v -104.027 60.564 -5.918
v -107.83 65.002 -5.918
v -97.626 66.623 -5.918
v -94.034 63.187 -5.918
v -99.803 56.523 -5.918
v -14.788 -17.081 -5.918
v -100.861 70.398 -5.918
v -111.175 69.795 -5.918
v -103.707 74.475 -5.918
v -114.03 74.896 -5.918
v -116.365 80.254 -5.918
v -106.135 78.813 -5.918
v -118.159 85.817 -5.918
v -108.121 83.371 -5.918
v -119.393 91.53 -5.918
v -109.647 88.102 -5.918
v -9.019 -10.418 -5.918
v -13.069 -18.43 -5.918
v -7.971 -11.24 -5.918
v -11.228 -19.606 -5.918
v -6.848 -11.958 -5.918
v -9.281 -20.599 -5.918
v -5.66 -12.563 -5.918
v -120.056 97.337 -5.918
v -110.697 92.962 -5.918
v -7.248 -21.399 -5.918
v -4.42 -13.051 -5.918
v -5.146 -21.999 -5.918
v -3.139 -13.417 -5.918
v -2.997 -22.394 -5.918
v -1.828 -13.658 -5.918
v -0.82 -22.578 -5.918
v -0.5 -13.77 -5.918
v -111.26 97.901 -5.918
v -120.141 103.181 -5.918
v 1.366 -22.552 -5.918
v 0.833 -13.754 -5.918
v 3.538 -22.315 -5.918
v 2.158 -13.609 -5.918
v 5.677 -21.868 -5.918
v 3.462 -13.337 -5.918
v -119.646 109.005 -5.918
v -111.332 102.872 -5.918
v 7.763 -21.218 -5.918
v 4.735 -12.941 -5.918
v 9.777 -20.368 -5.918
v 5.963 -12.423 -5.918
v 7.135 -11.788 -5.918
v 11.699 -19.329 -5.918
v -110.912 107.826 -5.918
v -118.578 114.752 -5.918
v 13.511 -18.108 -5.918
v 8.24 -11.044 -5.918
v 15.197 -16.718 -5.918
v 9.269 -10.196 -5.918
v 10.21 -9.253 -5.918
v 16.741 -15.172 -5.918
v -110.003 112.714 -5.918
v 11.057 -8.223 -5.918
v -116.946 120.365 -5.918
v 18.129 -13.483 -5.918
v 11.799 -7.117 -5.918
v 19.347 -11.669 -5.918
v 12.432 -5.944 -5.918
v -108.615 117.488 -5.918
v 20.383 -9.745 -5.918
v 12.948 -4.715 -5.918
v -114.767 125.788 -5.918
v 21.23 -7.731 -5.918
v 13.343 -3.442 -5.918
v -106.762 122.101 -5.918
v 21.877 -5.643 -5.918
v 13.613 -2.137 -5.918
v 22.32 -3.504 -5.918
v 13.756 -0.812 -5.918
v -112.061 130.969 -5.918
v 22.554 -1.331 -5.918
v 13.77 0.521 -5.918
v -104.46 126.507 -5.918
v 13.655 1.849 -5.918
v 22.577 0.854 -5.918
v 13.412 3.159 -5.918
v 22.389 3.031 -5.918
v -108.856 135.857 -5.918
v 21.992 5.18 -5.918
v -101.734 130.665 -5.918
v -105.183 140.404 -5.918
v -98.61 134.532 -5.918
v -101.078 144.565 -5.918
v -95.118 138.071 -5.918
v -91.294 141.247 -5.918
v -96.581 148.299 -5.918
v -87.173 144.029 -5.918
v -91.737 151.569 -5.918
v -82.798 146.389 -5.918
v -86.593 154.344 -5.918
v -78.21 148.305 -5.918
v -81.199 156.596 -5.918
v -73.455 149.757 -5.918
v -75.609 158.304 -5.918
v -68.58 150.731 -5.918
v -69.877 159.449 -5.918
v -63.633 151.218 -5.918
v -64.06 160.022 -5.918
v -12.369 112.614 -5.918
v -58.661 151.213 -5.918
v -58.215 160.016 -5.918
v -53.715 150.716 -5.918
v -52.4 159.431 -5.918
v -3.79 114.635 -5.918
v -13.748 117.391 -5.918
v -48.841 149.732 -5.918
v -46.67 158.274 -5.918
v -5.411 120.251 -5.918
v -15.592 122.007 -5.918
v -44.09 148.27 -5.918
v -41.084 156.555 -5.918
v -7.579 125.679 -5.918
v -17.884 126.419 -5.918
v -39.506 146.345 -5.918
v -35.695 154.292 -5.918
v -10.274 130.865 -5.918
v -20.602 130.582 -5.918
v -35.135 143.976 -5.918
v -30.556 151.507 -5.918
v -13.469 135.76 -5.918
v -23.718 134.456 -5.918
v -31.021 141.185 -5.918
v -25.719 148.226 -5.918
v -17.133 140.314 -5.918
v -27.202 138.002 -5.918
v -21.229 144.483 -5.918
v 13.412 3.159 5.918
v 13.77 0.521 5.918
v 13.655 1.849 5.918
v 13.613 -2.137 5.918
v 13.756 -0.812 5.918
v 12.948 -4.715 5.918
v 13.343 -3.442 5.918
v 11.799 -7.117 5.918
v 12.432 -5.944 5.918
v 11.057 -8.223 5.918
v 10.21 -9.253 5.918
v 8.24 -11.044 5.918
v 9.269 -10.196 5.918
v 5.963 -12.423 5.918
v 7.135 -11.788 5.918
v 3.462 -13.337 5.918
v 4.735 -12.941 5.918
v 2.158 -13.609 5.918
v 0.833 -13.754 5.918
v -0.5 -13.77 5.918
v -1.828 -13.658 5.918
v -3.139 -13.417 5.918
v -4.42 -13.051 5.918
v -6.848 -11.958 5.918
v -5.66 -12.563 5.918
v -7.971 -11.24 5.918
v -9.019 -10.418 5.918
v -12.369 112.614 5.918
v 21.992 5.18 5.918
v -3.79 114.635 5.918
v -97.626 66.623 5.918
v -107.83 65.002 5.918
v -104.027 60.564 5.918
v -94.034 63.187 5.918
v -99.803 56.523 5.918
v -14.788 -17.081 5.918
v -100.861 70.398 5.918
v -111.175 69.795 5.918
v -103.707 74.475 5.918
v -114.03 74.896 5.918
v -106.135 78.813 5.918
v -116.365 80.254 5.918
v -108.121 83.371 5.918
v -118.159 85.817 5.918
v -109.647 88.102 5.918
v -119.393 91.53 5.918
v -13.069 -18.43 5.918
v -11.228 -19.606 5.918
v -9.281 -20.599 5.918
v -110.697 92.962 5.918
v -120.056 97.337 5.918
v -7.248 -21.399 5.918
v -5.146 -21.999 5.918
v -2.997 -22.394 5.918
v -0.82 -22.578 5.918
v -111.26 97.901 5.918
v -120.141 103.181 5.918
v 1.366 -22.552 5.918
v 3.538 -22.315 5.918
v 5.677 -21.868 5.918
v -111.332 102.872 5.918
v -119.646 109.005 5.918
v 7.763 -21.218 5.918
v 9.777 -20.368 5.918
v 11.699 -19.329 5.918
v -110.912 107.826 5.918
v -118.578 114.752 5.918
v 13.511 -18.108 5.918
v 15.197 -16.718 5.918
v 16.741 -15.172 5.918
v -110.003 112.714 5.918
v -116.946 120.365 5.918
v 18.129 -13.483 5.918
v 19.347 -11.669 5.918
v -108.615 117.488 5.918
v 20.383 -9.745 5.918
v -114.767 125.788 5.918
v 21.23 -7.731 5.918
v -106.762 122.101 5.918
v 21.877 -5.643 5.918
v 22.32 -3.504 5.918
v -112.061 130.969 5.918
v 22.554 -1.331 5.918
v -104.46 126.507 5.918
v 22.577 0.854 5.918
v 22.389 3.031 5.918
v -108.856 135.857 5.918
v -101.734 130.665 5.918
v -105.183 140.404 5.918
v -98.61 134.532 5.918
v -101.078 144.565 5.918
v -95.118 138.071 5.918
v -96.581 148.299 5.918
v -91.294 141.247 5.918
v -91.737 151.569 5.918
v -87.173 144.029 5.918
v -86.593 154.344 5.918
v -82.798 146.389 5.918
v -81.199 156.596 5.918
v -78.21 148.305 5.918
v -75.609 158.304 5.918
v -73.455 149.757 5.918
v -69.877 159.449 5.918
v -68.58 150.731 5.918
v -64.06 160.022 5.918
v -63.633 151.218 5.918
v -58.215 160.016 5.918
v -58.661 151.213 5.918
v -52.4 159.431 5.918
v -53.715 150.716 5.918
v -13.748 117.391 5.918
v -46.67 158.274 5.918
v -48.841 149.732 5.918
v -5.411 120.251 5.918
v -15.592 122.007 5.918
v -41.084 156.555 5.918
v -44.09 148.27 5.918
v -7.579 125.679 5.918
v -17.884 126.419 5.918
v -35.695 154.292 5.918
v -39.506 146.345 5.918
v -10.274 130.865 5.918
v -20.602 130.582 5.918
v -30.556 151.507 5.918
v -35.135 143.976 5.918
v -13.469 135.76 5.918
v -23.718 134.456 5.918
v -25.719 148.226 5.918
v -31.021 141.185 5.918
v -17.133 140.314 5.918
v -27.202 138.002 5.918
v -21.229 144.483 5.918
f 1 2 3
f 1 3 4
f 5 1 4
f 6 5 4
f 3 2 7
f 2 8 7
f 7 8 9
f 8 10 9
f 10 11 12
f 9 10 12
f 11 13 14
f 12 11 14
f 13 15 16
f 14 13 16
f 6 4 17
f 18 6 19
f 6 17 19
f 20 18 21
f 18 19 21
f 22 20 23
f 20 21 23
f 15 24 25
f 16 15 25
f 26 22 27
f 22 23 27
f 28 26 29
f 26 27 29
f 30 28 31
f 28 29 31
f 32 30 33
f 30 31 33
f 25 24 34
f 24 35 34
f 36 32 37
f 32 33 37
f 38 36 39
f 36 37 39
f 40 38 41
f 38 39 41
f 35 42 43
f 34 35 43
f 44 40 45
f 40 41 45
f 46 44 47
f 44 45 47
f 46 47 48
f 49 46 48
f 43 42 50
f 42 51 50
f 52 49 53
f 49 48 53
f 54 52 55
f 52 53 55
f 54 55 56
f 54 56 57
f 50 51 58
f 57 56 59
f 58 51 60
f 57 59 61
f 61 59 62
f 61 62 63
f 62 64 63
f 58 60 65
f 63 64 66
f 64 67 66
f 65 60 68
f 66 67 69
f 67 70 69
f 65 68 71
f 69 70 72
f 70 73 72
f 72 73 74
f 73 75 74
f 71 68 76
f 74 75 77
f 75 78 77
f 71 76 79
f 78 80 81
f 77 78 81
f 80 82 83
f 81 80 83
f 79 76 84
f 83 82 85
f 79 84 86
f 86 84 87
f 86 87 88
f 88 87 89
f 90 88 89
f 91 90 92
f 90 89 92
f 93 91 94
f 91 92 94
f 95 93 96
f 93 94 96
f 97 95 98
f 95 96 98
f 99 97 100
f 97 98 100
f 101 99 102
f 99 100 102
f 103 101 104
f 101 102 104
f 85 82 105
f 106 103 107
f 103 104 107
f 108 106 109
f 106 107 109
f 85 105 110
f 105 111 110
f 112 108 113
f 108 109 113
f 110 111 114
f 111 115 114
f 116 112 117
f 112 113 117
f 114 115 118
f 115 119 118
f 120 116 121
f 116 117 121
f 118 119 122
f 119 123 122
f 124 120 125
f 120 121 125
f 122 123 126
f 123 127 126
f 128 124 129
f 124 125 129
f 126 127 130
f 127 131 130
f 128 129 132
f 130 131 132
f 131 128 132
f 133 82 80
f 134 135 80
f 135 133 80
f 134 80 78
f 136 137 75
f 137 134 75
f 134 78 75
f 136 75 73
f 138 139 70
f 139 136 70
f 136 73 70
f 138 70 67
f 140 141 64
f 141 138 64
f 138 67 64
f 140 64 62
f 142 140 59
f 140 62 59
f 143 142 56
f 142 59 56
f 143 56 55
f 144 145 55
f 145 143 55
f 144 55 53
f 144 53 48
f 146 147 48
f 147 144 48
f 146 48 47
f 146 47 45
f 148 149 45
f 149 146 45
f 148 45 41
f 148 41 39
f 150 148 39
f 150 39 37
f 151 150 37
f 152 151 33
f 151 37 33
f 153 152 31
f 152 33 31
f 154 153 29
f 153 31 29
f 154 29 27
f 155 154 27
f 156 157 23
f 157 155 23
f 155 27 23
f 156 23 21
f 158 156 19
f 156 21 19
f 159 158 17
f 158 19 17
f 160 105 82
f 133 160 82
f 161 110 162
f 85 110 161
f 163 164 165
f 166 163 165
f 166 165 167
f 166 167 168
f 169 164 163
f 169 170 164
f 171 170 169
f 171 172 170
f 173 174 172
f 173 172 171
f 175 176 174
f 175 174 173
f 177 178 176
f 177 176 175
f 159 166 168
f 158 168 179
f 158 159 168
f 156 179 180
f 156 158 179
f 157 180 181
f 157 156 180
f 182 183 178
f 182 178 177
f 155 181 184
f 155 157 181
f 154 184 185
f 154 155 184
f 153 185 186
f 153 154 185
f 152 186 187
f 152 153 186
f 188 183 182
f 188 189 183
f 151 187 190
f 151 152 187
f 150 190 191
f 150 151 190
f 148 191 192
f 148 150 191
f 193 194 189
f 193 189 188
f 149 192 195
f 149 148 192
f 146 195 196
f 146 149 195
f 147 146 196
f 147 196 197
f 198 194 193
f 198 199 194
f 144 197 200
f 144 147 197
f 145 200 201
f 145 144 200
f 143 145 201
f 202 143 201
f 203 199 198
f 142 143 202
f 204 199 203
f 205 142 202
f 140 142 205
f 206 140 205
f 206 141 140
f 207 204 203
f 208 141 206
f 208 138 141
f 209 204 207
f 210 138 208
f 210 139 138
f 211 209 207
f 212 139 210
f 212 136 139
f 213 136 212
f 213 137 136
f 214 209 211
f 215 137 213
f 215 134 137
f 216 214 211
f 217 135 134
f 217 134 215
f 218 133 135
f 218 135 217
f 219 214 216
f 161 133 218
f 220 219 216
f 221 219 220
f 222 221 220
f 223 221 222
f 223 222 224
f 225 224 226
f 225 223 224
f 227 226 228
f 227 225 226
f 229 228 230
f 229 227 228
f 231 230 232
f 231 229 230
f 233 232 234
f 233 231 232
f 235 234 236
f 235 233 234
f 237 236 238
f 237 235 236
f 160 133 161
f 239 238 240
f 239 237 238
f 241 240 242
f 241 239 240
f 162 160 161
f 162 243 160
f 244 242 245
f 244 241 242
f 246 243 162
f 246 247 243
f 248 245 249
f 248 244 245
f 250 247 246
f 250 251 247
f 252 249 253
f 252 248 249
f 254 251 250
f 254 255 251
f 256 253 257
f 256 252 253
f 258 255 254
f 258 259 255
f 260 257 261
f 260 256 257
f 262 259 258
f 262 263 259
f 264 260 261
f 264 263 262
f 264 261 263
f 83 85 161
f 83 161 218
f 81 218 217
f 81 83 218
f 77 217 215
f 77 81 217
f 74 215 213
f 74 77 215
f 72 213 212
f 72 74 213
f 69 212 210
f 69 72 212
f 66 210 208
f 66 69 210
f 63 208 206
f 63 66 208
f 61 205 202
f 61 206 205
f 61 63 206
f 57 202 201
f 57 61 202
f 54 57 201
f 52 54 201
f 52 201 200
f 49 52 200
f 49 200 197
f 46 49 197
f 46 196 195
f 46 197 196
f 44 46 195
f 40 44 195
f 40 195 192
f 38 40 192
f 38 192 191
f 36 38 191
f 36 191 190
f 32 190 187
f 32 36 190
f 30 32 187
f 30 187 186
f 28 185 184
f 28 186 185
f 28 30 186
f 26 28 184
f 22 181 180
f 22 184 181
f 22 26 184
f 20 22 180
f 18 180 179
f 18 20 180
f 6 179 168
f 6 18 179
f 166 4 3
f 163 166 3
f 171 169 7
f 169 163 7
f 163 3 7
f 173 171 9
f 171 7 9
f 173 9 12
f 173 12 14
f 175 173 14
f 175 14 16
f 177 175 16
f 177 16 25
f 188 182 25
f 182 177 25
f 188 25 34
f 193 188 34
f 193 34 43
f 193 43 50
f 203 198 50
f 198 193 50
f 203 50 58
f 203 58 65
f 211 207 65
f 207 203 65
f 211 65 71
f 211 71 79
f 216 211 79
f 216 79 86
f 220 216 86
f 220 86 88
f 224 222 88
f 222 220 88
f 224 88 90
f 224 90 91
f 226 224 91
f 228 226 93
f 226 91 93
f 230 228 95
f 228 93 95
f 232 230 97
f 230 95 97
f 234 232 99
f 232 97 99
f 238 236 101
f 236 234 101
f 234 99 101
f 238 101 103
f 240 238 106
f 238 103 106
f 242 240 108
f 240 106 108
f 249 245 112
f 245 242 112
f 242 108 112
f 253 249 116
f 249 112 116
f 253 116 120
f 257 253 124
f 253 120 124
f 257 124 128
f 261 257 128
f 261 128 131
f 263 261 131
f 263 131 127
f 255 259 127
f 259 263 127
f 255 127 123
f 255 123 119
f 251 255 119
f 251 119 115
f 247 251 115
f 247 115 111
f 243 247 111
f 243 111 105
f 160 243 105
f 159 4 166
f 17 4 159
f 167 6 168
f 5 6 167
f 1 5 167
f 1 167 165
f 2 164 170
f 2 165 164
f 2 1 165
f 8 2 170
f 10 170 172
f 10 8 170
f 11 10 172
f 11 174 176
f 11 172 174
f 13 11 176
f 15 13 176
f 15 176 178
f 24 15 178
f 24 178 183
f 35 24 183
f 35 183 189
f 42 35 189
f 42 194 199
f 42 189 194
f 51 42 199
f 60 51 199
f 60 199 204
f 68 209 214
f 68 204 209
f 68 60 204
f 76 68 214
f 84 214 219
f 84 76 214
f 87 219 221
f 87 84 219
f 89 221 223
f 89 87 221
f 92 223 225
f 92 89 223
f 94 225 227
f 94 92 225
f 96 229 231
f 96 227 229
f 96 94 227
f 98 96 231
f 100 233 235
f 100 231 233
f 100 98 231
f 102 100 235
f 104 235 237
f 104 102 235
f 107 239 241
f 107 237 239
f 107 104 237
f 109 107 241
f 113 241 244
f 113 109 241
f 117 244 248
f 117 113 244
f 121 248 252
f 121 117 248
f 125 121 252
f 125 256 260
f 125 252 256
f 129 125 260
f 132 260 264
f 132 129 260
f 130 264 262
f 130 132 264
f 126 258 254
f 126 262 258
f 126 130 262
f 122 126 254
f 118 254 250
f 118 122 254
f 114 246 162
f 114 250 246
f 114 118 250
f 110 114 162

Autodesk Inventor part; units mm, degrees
ref_plane "YZ Plane" through (0, 0, 0) normal (1, 0, 0) x (0, 1, 0)
ref_plane "XZ Plane" through (0, 0, 0) normal (0, 1, 0) x (-1, 0, 0)
ref_plane "XY Plane" through (0, 0, 0) normal (0, 0, 1) x (1, 0, 0)
sketch "Sketch1" plane through (0, 0, 0) normal (0, 0, 1) x (1, 0, 0)
  circle A0 centre (0, 0) radius 18.1864 construction
  circle A1 centre (-61.1981, 101.1124) radius 54.5719 construction
  line L0 (-61.1981, 101.1124) -> (0, 0) construction
  arc A2 (-12.3694, 112.6139) -> (-94.0337, 63.1868) centre (-61.1981, 101.1124) ccw
  arc A3 (-9.0194, -10.4175) -> (13.4124, 3.1593) centre (0, 0) ccw
  line L1 (-94.0337, 63.1868) -> (-9.0194, -10.4175)
  line L2 (-12.3694, 112.6139) -> (13.4124, 3.1593)
  line L3 (-14.7885, -17.0809) -> (-99.8028, 56.5234)
  arc A4 (-3.7904, 114.6347) -> (-99.8028, 56.5234) centre (-61.1981, 101.1124) ccw
  line L4 (-3.7904, 114.6347) -> (21.9915, 5.1801)
  arc A5 (-14.7885, -17.0809) -> (21.9915, 5.1801) centre (0, 0) ccw
  line L5 (-11.9039, -13.7492) -> (-96.9182, 59.8551) construction
  arc A6 (-8.0799, 113.6243) -> (-96.9182, 59.8551) centre (-61.1981, 101.1124) ccw construction
  line L6 (-8.0799, 113.6243) -> (17.7019, 4.1697) construction
  arc A7 (-11.9039, -13.7492) -> (17.7019, 4.1697) centre (0, 0) ccw construction
  dimension "d0" = 36.3728
  dimension "d1" = 109.1438
  dimension "d2" = 118.1902
  dimension "d3" = 8.8138
  dimension "d4" = 61.1981
  dimension "d5" = 4.4069
extrude "Extrusion1" add sketch "Sketch1" along normal mid plane 11.8364
equation "\"d5\" = 0.5 * d3"
properties part number "EL2-CGB-009" material "Steel"
